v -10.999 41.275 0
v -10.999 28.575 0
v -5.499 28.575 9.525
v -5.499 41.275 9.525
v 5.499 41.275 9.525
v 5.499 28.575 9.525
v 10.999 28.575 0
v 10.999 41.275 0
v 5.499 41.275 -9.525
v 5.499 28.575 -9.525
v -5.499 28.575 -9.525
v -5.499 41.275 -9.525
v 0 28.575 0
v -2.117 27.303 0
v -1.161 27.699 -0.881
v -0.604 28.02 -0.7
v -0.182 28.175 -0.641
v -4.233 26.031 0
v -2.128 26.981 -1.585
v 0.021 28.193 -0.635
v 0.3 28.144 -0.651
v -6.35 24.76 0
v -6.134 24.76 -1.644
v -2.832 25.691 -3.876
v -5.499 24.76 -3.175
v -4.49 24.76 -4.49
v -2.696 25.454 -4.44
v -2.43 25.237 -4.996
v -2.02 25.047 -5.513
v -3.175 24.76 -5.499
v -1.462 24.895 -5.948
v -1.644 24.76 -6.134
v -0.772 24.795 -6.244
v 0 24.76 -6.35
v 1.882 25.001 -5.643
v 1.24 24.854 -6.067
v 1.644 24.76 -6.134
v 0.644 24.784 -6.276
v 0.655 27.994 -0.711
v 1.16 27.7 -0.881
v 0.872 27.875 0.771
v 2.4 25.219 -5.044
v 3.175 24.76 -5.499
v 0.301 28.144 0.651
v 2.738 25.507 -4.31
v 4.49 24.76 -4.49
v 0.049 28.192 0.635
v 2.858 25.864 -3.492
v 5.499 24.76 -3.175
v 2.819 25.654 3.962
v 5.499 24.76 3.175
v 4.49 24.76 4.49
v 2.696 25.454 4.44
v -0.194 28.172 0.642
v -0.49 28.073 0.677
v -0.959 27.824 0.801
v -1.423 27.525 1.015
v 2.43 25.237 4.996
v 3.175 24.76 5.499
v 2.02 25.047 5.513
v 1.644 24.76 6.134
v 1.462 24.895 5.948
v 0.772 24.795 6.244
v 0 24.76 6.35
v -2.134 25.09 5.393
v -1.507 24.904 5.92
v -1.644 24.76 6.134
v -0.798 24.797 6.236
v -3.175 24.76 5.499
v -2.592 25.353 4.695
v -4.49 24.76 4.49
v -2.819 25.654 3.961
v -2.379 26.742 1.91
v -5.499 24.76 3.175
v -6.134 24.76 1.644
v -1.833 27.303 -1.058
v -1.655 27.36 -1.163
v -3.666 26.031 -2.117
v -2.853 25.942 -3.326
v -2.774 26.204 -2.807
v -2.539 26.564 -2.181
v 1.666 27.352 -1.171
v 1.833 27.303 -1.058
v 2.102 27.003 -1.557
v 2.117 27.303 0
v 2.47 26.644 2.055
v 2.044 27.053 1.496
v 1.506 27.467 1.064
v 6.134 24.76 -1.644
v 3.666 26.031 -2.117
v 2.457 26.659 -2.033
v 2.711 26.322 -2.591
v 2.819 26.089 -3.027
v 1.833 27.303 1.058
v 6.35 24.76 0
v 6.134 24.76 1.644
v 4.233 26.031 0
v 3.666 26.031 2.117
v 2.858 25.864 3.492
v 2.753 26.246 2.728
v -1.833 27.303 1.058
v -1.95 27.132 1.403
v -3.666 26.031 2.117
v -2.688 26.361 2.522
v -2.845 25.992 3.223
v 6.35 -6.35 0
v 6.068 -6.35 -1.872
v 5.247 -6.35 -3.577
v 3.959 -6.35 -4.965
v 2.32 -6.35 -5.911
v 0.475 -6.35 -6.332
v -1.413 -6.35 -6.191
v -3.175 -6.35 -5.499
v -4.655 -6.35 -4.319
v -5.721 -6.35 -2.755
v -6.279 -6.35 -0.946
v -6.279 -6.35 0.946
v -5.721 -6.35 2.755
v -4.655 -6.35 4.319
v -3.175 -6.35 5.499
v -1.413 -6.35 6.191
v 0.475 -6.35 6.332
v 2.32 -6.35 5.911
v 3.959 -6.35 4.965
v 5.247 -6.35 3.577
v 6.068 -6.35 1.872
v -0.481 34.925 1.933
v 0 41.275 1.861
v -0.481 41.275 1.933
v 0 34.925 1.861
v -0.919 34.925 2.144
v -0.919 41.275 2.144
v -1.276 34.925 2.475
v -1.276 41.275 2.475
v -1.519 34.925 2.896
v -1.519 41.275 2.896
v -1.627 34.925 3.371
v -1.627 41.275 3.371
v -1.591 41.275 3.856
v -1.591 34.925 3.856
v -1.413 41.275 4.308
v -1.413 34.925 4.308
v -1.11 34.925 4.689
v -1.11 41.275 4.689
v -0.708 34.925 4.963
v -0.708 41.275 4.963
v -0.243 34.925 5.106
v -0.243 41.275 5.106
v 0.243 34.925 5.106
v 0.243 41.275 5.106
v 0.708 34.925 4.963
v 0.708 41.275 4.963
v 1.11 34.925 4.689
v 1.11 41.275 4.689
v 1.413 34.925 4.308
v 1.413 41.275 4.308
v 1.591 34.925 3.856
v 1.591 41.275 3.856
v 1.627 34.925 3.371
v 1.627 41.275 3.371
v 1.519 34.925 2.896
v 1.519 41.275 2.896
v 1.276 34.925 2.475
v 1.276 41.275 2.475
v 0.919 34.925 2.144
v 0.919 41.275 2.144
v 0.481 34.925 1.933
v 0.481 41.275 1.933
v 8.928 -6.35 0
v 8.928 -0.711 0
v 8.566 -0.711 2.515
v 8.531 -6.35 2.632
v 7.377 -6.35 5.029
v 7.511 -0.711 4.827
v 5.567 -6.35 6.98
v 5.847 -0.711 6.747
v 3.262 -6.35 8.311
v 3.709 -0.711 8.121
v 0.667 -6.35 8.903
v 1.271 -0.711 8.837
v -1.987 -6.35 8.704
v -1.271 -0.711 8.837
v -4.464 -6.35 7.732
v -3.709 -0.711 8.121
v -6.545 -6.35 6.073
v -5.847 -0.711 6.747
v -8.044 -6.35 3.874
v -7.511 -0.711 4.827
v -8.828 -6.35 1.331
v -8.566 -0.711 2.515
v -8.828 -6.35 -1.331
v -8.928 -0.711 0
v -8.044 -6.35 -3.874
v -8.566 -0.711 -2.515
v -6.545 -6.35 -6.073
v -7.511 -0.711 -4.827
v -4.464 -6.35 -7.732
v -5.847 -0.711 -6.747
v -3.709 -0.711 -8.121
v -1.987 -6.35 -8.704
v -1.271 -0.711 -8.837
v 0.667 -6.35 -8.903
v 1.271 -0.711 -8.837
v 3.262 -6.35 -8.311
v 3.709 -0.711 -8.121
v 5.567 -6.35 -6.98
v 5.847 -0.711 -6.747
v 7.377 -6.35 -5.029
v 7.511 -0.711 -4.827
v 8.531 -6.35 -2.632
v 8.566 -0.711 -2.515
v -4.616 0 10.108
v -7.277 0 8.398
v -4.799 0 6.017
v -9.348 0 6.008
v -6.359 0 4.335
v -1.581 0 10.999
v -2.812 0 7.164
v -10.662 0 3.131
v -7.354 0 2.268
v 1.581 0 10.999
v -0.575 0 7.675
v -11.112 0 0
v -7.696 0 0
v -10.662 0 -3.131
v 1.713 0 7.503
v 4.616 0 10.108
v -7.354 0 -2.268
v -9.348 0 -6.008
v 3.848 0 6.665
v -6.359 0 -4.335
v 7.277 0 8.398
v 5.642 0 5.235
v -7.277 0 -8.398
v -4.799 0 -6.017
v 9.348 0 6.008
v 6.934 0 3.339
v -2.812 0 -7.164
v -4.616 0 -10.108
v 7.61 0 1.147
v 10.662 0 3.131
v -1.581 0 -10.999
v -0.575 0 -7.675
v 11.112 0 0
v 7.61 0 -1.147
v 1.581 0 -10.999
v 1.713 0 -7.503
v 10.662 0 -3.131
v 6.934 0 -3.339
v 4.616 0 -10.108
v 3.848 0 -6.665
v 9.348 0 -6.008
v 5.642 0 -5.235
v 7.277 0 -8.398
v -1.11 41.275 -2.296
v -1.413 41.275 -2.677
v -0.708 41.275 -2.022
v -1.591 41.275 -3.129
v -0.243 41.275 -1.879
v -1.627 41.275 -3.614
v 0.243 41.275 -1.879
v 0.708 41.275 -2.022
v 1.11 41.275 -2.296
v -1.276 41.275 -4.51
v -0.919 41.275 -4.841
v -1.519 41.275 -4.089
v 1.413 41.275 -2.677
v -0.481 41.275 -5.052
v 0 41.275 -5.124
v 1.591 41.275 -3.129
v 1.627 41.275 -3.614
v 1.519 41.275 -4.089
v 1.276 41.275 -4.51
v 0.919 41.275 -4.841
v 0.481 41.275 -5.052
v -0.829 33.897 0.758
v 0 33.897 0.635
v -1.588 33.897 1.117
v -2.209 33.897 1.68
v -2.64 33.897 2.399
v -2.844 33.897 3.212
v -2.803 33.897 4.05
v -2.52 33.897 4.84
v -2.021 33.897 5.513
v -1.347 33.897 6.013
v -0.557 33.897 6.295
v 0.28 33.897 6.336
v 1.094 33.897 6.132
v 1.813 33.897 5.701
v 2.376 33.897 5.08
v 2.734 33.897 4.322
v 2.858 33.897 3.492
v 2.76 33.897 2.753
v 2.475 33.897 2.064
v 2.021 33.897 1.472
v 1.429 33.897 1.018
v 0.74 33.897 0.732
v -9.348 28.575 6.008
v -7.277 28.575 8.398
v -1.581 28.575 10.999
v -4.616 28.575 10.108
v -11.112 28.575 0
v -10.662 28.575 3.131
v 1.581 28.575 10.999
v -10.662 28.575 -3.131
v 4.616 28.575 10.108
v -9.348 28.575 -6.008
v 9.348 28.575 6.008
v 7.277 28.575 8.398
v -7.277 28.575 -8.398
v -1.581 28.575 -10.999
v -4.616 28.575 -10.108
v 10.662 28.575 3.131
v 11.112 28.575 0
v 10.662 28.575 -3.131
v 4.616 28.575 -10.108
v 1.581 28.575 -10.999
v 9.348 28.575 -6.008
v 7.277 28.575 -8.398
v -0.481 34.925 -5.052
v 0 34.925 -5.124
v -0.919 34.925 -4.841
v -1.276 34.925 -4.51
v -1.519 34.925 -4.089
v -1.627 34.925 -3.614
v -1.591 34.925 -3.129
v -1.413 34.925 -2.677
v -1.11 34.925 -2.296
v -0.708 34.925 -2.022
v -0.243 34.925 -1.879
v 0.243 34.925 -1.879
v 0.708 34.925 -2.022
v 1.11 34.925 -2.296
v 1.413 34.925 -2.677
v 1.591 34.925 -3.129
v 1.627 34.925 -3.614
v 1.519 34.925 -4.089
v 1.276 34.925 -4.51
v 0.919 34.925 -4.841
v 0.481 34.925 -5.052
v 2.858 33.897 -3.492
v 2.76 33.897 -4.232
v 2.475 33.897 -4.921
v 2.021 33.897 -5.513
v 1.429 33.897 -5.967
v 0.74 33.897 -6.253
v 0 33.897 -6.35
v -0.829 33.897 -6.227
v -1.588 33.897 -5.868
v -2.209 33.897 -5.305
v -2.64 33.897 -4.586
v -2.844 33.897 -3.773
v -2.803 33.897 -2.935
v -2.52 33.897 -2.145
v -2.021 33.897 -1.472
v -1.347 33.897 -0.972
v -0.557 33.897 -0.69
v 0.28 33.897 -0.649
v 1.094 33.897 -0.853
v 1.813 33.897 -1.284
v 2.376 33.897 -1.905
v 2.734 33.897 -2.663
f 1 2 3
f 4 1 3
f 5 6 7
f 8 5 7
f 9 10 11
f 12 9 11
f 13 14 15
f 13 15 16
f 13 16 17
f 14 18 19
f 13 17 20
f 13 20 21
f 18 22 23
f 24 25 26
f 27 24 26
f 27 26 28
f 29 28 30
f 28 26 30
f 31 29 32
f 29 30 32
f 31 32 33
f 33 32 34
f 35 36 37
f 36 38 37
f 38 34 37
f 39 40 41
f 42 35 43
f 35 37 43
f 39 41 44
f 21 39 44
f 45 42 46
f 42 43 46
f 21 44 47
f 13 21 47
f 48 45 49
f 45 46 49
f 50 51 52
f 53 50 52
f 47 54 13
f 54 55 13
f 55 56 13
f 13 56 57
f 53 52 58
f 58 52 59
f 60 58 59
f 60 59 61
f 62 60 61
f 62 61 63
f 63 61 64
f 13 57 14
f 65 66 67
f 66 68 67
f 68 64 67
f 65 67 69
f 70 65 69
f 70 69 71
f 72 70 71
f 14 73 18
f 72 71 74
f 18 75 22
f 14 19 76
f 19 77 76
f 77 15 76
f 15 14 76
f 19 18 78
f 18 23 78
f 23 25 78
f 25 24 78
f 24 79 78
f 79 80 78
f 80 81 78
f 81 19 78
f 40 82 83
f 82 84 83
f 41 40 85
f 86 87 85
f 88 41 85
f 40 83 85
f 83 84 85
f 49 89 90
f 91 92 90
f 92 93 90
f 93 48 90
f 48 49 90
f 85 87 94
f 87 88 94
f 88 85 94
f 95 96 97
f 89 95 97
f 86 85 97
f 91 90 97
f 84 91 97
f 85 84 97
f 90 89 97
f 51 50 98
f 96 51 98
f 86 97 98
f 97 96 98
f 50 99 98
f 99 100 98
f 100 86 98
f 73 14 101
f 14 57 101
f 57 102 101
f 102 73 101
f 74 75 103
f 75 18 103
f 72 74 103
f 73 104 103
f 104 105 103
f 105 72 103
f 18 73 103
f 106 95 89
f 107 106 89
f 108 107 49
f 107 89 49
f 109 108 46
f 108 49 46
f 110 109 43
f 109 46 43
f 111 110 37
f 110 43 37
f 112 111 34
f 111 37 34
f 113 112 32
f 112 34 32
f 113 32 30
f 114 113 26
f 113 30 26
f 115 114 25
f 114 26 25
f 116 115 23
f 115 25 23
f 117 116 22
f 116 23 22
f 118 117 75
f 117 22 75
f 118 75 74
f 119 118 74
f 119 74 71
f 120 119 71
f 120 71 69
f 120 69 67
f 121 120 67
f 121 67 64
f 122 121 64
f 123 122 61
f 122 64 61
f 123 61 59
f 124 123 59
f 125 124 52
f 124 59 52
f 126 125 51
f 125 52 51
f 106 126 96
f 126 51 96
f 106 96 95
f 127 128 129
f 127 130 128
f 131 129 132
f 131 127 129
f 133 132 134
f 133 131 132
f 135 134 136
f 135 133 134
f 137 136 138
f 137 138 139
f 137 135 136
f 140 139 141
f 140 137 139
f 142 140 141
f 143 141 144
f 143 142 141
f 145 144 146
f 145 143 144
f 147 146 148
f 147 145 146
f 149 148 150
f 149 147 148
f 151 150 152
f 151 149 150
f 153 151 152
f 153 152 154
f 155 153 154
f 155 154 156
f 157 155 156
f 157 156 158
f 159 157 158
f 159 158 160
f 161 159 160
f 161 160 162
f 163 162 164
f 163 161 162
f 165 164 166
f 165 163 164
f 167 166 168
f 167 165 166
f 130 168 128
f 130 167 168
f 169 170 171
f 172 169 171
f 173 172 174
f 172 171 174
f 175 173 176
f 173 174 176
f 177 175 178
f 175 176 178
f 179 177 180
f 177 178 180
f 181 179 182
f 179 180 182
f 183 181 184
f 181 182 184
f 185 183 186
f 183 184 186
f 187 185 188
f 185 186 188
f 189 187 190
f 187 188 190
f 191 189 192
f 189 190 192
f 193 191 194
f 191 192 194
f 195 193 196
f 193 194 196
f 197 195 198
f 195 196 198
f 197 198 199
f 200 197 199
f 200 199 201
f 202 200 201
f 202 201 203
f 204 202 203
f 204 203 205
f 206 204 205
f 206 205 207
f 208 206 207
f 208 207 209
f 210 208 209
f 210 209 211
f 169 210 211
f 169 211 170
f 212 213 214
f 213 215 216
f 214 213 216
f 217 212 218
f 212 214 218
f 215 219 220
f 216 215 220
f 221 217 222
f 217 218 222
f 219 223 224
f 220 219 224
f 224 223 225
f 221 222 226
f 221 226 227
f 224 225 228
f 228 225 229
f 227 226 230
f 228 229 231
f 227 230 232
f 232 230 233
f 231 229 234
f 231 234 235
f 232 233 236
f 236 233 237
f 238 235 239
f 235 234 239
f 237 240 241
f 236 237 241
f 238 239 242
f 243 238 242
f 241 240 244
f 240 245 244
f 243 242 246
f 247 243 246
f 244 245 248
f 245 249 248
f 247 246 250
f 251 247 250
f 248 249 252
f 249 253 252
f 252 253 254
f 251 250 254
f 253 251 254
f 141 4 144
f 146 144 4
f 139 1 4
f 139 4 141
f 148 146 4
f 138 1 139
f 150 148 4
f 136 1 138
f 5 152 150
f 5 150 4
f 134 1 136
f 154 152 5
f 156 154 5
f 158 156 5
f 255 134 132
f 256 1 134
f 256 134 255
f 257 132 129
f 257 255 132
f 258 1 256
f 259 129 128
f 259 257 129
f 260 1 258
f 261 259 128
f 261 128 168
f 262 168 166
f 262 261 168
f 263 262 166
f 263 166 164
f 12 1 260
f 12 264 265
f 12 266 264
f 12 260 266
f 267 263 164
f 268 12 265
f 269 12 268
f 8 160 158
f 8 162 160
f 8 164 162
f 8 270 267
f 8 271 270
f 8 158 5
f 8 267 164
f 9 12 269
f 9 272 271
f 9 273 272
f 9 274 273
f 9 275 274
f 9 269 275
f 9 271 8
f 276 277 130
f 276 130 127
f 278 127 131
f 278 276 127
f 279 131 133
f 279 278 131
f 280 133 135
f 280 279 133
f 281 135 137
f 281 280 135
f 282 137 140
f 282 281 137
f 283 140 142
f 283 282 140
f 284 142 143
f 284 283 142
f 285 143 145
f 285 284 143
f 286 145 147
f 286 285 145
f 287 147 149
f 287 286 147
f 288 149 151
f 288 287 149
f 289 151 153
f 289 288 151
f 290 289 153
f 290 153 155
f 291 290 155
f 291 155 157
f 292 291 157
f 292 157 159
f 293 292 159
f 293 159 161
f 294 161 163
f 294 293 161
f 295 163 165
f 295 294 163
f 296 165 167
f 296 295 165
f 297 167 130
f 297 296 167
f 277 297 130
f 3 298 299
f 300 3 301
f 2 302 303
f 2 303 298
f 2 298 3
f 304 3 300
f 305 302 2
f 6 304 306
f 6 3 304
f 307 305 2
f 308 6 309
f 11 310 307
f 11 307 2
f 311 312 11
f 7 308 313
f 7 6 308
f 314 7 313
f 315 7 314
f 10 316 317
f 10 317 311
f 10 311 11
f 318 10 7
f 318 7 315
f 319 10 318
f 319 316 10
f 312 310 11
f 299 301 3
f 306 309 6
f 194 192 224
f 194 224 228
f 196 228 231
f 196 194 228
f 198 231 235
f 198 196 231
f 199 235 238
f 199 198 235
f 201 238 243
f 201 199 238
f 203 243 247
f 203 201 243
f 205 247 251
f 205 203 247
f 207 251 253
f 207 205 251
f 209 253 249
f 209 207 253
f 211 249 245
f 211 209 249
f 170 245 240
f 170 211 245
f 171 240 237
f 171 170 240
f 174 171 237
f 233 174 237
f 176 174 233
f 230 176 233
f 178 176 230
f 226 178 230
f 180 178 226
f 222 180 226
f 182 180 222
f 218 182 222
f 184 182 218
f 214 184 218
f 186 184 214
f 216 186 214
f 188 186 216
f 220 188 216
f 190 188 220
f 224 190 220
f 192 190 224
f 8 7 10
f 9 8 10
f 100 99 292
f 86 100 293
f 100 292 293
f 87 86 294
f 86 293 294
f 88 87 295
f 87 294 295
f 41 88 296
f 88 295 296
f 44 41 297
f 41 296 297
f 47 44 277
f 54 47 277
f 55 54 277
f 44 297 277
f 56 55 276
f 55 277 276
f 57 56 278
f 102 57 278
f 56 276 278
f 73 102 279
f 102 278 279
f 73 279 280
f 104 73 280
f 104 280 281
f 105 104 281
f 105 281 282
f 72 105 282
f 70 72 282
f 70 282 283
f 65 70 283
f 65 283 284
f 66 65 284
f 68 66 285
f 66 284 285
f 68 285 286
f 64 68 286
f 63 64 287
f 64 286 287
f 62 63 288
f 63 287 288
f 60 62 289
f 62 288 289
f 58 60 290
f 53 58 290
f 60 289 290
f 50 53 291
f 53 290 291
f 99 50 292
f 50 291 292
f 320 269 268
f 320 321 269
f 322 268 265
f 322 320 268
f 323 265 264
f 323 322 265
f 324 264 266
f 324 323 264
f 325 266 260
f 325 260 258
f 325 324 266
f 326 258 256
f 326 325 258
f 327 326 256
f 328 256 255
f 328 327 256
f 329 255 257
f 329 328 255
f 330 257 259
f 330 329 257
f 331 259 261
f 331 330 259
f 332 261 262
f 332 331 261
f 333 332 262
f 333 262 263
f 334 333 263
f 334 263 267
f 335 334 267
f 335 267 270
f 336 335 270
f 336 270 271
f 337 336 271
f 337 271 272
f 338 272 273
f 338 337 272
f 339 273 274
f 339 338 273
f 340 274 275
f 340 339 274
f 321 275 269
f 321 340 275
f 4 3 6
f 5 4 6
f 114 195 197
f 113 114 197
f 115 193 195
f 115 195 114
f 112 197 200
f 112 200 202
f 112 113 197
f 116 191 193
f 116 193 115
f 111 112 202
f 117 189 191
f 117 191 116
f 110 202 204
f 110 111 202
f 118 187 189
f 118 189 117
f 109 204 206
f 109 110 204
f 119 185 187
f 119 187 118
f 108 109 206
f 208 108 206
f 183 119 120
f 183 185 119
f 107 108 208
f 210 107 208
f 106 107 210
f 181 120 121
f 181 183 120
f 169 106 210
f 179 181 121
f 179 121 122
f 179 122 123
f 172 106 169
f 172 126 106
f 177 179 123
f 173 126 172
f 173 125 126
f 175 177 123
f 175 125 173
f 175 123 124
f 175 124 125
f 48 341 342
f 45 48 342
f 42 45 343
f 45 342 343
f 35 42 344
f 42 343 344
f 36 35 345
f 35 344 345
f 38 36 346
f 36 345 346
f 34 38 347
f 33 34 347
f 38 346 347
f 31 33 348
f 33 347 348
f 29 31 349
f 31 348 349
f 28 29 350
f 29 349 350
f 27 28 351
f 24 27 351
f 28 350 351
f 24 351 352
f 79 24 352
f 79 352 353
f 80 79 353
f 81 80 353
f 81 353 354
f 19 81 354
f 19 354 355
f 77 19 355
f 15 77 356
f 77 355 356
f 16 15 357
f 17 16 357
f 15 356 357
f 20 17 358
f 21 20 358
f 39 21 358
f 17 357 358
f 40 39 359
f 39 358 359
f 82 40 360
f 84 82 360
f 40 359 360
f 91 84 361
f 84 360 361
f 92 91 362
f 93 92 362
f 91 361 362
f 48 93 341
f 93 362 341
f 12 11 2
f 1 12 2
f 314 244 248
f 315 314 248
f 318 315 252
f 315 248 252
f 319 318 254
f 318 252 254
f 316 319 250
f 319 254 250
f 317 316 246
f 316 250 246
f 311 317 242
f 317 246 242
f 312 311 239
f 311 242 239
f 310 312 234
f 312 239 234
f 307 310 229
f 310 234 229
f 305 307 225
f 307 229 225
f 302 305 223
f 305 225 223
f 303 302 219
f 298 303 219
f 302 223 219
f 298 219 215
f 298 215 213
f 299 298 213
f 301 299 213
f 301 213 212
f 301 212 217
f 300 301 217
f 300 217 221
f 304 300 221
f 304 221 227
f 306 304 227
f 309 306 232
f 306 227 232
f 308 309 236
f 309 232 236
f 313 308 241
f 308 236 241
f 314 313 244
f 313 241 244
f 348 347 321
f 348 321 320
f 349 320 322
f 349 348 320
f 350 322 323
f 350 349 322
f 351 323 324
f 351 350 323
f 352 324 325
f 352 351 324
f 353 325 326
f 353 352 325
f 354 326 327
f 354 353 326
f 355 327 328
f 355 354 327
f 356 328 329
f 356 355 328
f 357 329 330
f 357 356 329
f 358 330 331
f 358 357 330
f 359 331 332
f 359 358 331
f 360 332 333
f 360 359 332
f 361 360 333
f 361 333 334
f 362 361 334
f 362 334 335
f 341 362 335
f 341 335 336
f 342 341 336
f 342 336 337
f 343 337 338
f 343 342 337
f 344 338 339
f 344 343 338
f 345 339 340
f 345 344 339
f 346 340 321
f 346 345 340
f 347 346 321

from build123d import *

# Parameters (mm, degrees)
MAIN_BODY_PROFILE_R     = 11.1125
MAIN_BODY_EXTRUDE_DEPTH = 28.575
HEXAGON_BODY_DEPTH      = 12.7
TIP_PROFILE_R           = 8.9281
TIP_BODY_DEPTH          = 6.35
BACK_POWDER_HOLE_D      = 12.7
BACK_POWDER_HOLE_DEPTH  = 31.109535069
BACK_POWDER_HOLE_TIP    = 3.815464931
SCREW_HOLES_AT_2_COUNT  = 2
SCREW_HOLES_AT_2_PITCH  = 6.985
SKETCH12_R              = 2.8575
THROUGH_HOLES_DEPTH     = 41.246641376


with BuildPart() as part:
    # Main Body Profile → Main Body Extrude (new body)
    with BuildSketch(Plane(origin=(0, 0, 0), x_dir=(1, 0, 0), z_dir=(0, 1, 0))):
        Circle(MAIN_BODY_PROFILE_R)
    extrude(amount=MAIN_BODY_EXTRUDE_DEPTH)

    # Hexagon Profile → Hexagon Body (add)
    with BuildSketch(Plane(origin=(0, 28.575, 0), x_dir=(1, 0, 0), z_dir=(0, 1, 0))):
        Polygon((5.499261314, 9.525), (-5.499261314, 9.525), (-10.998522628, 0), (-5.499261314, -9.525), (5.499261314, -9.525), (10.998522628, 0), align=None)
    extrude(amount=HEXAGON_BODY_DEPTH)

    # Tip Profile → Tip Body (add)
    with BuildSketch(Plane.XZ):
        Circle(TIP_PROFILE_R)
    extrude(amount=TIP_BODY_DEPTH)

    # Back Powder Hole
    with Locations(Plane(origin=(0, -6.35, 0), x_dir=(-1, 0, 0), z_dir=(0, -1, 0))):
        with Locations((0, 0)):
            Hole(BACK_POWDER_HOLE_D / 2, depth=BACK_POWDER_HOLE_DEPTH)
            with Locations((0, 0, -(BACK_POWDER_HOLE_DEPTH + BACK_POWDER_HOLE_TIP / 2))):  # 118° drill point
                Cone(0, BACK_POWDER_HOLE_D / 2, BACK_POWDER_HOLE_TIP, mode=Mode.SUBTRACT)

    # Sketch11 → Screw Holes (revolve, cut)
    with BuildSketch(Plane(origin=(0, 33.896641376, 3.4925), x_dir=(0, 0, -1), z_dir=(1, 0, 0))):
        Polygon((0, 0), (0, 7.378358624), (1.63195, 7.378358624), (1.63195, 1.028358553), (2.8575, 0), align=None)
    screw_holes = revolve(axis=Axis((0, 27.546641376, 3.4925), (0, 1, 0)), mode=Mode.SUBTRACT)

    # Screw Holes at 2: Screw Holes ×2
    with Locations(*[(0, 0, -i * SCREW_HOLES_AT_2_PITCH) for i in range(1, SCREW_HOLES_AT_2_COUNT)]):
        add(screw_holes, mode=Mode.SUBTRACT)

    # Sketch12 → Through Holes (cut, through all)
    with BuildSketch(Plane(origin=(0, 33.896641376, 0), x_dir=(1, 0, 0), z_dir=(0, 1, 0))):
        with Locations((0, 3.4925)):
            Circle(SKETCH12_R)
        with Locations((0, -3.4925)):
            Circle(SKETCH12_R)
    extrude(amount=-THROUGH_HOLES_DEPTH, mode=Mode.SUBTRACT)

    # Sketch13 → Revolved Cut (revolve, cut)
    with BuildSketch(Plane.XY):
        Polygon((-8.9281, 0), (-7.696200006, 0), (-8.9281, -0.7112378), align=None)
    revolve(axis=Axis((0, 0, 0), (0, -1, 0)), mode=Mode.SUBTRACT)


solid = part.part
